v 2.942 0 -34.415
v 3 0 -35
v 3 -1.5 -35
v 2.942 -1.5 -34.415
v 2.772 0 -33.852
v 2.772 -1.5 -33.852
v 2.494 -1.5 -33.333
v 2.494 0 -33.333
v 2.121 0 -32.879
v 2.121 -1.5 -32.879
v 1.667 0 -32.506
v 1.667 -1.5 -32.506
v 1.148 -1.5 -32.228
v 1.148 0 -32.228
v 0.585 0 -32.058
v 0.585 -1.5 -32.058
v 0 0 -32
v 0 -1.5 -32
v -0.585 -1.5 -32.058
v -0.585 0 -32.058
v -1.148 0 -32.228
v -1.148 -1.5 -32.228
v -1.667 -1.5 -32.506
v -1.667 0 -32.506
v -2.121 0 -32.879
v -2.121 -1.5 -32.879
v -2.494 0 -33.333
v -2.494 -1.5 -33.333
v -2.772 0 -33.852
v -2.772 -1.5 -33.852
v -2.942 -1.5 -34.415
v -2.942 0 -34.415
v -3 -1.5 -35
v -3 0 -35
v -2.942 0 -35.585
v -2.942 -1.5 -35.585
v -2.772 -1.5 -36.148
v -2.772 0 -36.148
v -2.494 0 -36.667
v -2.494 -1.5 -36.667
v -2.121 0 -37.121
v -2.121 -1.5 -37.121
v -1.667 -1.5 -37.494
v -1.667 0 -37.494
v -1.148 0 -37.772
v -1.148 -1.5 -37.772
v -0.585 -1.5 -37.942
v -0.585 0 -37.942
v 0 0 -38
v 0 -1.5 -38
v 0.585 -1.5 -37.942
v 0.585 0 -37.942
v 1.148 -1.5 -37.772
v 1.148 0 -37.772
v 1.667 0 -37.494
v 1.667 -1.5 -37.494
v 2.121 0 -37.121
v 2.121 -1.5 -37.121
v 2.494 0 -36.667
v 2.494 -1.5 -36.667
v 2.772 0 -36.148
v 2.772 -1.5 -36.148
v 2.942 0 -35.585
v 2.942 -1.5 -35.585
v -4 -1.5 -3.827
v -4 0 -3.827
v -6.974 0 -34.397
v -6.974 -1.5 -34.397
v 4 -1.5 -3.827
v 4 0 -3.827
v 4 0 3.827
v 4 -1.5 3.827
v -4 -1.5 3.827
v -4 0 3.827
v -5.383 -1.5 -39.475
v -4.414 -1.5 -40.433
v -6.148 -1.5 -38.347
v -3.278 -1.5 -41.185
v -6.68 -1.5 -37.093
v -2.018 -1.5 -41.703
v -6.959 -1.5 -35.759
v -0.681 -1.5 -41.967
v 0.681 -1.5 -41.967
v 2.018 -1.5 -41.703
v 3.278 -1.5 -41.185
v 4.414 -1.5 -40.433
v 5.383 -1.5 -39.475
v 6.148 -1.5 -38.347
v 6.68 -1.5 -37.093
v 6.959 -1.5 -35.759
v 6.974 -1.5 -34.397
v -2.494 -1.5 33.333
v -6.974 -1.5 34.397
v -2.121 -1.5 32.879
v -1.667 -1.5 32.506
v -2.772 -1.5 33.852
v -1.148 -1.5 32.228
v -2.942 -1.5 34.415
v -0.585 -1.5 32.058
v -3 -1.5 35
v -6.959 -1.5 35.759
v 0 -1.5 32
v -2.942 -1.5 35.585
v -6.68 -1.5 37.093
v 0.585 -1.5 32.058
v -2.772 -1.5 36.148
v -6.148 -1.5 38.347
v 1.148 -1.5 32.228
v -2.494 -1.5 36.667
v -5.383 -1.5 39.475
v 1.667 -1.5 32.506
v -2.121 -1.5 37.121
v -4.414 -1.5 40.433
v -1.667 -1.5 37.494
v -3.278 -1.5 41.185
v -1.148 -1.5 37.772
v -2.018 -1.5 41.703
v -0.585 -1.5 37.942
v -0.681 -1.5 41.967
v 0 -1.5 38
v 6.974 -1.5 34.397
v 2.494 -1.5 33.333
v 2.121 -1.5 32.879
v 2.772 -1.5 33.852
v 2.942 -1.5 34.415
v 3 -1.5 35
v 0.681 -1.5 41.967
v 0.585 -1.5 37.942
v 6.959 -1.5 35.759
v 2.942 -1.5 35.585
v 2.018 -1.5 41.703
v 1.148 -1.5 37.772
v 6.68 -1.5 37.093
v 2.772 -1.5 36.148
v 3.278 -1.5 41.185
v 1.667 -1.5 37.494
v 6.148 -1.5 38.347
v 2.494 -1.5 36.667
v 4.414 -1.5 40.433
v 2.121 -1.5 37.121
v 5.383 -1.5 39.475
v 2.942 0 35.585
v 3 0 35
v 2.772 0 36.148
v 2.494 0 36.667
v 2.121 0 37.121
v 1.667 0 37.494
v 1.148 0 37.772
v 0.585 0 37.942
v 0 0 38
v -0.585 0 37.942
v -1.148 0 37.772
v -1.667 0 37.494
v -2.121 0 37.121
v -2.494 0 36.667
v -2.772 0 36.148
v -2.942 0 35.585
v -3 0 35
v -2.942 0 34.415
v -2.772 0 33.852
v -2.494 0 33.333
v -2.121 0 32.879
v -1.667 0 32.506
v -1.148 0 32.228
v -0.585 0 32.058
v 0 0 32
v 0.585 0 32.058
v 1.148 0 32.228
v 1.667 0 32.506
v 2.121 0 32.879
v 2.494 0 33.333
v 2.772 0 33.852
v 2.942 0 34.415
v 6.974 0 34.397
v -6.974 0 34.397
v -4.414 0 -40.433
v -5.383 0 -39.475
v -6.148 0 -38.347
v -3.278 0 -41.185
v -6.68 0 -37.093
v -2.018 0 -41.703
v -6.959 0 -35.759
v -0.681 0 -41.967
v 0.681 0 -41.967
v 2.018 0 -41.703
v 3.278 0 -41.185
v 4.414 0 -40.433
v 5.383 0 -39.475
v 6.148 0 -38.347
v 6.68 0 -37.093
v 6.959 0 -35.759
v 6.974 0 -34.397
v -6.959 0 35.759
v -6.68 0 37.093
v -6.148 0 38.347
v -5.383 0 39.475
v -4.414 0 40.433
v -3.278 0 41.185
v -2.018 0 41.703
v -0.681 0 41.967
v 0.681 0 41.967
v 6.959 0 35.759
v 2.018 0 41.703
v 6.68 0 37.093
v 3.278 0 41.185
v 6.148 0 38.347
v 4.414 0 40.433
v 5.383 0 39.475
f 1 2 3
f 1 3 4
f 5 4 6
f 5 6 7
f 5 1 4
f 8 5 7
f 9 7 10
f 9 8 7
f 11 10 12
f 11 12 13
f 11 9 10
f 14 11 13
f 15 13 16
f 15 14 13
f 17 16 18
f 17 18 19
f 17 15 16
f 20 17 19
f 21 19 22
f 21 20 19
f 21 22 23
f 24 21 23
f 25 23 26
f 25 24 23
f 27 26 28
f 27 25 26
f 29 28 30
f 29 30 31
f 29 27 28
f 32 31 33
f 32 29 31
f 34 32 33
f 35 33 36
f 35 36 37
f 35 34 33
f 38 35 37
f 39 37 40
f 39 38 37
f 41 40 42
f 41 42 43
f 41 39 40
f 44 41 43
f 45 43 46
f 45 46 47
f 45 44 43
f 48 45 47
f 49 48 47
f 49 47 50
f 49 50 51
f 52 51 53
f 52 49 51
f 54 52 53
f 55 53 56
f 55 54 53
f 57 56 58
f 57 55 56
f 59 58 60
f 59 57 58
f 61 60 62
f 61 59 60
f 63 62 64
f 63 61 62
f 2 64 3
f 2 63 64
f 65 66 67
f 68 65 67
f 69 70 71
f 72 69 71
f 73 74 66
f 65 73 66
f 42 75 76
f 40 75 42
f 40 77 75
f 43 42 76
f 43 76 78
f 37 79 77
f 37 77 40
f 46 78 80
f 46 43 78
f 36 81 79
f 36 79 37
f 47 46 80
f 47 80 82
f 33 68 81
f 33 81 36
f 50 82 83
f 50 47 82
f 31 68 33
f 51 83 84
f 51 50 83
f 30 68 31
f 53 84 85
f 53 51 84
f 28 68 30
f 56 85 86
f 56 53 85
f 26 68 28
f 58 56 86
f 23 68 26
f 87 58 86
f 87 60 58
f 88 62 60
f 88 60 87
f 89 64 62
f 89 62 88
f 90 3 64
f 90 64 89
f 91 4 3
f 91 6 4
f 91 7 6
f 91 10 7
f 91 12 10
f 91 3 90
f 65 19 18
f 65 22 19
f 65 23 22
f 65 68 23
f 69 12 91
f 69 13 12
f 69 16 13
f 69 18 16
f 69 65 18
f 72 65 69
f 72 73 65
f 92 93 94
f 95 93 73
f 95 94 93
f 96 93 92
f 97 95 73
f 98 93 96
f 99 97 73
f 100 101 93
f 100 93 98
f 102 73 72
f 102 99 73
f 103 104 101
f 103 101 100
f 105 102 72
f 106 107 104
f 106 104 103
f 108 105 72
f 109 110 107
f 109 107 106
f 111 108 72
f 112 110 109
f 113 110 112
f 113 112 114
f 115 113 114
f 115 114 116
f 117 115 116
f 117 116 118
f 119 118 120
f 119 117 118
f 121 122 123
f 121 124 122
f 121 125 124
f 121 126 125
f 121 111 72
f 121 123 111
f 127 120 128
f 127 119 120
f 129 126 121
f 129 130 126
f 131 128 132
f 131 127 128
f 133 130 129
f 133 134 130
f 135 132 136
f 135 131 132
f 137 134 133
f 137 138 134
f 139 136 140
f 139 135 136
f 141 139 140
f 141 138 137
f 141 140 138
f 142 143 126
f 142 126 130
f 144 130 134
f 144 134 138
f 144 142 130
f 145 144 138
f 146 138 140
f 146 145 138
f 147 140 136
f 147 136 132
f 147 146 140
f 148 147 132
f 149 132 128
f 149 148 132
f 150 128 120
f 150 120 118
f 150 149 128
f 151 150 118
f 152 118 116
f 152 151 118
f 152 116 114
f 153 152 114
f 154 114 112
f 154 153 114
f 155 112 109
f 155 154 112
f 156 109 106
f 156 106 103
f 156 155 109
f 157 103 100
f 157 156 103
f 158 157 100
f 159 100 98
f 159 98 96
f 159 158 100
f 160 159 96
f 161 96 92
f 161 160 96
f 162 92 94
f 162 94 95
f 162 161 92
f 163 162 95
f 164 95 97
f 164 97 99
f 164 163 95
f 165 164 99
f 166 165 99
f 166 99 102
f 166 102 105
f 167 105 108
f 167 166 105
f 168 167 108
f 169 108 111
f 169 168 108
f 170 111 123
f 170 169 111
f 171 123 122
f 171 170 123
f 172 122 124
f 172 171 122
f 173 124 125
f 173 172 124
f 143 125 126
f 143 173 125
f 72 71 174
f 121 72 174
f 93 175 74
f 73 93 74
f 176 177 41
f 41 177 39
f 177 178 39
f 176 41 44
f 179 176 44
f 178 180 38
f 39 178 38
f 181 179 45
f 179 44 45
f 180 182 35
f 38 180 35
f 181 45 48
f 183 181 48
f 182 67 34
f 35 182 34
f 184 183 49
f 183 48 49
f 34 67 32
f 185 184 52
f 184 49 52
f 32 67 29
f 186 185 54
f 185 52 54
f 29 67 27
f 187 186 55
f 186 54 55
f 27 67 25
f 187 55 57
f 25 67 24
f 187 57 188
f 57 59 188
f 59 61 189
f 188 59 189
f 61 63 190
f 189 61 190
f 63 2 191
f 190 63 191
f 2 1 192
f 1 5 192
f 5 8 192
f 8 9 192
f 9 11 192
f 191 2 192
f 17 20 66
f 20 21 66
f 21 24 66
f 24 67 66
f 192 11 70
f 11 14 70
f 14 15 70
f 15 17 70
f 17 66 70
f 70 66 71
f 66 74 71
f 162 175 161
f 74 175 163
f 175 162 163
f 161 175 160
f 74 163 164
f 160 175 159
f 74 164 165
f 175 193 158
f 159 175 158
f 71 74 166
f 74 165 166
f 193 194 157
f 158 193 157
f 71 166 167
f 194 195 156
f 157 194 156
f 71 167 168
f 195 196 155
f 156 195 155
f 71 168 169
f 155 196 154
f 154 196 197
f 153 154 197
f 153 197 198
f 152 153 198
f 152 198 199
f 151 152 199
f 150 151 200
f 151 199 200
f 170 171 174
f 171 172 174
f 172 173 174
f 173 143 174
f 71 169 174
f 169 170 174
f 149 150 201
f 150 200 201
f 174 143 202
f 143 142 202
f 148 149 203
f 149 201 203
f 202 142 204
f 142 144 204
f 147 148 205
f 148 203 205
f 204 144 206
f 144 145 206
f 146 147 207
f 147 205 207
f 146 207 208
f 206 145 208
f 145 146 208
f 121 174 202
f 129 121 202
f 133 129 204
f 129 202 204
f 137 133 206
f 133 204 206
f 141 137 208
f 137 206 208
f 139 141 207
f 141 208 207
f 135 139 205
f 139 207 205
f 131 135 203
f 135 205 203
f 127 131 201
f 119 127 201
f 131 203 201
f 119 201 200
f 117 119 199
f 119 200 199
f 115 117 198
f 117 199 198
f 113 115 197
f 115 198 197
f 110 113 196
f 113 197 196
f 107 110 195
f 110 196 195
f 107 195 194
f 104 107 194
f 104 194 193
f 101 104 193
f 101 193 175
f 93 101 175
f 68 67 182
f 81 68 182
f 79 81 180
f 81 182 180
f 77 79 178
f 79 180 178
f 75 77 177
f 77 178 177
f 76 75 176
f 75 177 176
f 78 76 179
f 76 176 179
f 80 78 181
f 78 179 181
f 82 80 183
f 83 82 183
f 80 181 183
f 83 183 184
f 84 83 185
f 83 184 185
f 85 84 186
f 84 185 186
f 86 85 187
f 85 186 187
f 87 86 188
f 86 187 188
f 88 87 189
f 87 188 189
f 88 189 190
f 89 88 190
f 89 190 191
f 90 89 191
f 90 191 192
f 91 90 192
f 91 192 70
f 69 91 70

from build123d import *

# Parameters (mm, degrees)
F0_R     = 3
F1_DEPTH = 1.5


with BuildPart() as f1:
    # F0 (on Front) → F1 (new body)
    with BuildSketch(Plane.XZ):
        with BuildLine():
            Line((4, 3.826665), (6.973982, 34.397026))
            ThreePointArc((6.973982, 34.397026), (0, 42), (-6.973982, 34.397026))
            Line((-6.973982, 34.397026), (-4, 3.826665))
            Line((-4, 3.826665), (-4, 0))
            Line((-4, 0), (-4, -3.826665))
            Line((-4, -3.826665), (-6.973982, -34.397026))
            ThreePointArc((-6.973982, -34.397026), (0, -42), (6.973982, -34.397026))
            Line((6.973982, -34.397026), (4, -3.826665))
            Line((4, -3.826665), (4, 0))
            Line((4, 0), (4, 3.826665))
        make_face()
        with Locations((0, -35)):
            Circle(F0_R, mode=Mode.SUBTRACT)
        with Locations((0, 35)):
            Circle(F0_R, mode=Mode.SUBTRACT)
    extrude(amount=F1_DEPTH)


solid = f1.part
